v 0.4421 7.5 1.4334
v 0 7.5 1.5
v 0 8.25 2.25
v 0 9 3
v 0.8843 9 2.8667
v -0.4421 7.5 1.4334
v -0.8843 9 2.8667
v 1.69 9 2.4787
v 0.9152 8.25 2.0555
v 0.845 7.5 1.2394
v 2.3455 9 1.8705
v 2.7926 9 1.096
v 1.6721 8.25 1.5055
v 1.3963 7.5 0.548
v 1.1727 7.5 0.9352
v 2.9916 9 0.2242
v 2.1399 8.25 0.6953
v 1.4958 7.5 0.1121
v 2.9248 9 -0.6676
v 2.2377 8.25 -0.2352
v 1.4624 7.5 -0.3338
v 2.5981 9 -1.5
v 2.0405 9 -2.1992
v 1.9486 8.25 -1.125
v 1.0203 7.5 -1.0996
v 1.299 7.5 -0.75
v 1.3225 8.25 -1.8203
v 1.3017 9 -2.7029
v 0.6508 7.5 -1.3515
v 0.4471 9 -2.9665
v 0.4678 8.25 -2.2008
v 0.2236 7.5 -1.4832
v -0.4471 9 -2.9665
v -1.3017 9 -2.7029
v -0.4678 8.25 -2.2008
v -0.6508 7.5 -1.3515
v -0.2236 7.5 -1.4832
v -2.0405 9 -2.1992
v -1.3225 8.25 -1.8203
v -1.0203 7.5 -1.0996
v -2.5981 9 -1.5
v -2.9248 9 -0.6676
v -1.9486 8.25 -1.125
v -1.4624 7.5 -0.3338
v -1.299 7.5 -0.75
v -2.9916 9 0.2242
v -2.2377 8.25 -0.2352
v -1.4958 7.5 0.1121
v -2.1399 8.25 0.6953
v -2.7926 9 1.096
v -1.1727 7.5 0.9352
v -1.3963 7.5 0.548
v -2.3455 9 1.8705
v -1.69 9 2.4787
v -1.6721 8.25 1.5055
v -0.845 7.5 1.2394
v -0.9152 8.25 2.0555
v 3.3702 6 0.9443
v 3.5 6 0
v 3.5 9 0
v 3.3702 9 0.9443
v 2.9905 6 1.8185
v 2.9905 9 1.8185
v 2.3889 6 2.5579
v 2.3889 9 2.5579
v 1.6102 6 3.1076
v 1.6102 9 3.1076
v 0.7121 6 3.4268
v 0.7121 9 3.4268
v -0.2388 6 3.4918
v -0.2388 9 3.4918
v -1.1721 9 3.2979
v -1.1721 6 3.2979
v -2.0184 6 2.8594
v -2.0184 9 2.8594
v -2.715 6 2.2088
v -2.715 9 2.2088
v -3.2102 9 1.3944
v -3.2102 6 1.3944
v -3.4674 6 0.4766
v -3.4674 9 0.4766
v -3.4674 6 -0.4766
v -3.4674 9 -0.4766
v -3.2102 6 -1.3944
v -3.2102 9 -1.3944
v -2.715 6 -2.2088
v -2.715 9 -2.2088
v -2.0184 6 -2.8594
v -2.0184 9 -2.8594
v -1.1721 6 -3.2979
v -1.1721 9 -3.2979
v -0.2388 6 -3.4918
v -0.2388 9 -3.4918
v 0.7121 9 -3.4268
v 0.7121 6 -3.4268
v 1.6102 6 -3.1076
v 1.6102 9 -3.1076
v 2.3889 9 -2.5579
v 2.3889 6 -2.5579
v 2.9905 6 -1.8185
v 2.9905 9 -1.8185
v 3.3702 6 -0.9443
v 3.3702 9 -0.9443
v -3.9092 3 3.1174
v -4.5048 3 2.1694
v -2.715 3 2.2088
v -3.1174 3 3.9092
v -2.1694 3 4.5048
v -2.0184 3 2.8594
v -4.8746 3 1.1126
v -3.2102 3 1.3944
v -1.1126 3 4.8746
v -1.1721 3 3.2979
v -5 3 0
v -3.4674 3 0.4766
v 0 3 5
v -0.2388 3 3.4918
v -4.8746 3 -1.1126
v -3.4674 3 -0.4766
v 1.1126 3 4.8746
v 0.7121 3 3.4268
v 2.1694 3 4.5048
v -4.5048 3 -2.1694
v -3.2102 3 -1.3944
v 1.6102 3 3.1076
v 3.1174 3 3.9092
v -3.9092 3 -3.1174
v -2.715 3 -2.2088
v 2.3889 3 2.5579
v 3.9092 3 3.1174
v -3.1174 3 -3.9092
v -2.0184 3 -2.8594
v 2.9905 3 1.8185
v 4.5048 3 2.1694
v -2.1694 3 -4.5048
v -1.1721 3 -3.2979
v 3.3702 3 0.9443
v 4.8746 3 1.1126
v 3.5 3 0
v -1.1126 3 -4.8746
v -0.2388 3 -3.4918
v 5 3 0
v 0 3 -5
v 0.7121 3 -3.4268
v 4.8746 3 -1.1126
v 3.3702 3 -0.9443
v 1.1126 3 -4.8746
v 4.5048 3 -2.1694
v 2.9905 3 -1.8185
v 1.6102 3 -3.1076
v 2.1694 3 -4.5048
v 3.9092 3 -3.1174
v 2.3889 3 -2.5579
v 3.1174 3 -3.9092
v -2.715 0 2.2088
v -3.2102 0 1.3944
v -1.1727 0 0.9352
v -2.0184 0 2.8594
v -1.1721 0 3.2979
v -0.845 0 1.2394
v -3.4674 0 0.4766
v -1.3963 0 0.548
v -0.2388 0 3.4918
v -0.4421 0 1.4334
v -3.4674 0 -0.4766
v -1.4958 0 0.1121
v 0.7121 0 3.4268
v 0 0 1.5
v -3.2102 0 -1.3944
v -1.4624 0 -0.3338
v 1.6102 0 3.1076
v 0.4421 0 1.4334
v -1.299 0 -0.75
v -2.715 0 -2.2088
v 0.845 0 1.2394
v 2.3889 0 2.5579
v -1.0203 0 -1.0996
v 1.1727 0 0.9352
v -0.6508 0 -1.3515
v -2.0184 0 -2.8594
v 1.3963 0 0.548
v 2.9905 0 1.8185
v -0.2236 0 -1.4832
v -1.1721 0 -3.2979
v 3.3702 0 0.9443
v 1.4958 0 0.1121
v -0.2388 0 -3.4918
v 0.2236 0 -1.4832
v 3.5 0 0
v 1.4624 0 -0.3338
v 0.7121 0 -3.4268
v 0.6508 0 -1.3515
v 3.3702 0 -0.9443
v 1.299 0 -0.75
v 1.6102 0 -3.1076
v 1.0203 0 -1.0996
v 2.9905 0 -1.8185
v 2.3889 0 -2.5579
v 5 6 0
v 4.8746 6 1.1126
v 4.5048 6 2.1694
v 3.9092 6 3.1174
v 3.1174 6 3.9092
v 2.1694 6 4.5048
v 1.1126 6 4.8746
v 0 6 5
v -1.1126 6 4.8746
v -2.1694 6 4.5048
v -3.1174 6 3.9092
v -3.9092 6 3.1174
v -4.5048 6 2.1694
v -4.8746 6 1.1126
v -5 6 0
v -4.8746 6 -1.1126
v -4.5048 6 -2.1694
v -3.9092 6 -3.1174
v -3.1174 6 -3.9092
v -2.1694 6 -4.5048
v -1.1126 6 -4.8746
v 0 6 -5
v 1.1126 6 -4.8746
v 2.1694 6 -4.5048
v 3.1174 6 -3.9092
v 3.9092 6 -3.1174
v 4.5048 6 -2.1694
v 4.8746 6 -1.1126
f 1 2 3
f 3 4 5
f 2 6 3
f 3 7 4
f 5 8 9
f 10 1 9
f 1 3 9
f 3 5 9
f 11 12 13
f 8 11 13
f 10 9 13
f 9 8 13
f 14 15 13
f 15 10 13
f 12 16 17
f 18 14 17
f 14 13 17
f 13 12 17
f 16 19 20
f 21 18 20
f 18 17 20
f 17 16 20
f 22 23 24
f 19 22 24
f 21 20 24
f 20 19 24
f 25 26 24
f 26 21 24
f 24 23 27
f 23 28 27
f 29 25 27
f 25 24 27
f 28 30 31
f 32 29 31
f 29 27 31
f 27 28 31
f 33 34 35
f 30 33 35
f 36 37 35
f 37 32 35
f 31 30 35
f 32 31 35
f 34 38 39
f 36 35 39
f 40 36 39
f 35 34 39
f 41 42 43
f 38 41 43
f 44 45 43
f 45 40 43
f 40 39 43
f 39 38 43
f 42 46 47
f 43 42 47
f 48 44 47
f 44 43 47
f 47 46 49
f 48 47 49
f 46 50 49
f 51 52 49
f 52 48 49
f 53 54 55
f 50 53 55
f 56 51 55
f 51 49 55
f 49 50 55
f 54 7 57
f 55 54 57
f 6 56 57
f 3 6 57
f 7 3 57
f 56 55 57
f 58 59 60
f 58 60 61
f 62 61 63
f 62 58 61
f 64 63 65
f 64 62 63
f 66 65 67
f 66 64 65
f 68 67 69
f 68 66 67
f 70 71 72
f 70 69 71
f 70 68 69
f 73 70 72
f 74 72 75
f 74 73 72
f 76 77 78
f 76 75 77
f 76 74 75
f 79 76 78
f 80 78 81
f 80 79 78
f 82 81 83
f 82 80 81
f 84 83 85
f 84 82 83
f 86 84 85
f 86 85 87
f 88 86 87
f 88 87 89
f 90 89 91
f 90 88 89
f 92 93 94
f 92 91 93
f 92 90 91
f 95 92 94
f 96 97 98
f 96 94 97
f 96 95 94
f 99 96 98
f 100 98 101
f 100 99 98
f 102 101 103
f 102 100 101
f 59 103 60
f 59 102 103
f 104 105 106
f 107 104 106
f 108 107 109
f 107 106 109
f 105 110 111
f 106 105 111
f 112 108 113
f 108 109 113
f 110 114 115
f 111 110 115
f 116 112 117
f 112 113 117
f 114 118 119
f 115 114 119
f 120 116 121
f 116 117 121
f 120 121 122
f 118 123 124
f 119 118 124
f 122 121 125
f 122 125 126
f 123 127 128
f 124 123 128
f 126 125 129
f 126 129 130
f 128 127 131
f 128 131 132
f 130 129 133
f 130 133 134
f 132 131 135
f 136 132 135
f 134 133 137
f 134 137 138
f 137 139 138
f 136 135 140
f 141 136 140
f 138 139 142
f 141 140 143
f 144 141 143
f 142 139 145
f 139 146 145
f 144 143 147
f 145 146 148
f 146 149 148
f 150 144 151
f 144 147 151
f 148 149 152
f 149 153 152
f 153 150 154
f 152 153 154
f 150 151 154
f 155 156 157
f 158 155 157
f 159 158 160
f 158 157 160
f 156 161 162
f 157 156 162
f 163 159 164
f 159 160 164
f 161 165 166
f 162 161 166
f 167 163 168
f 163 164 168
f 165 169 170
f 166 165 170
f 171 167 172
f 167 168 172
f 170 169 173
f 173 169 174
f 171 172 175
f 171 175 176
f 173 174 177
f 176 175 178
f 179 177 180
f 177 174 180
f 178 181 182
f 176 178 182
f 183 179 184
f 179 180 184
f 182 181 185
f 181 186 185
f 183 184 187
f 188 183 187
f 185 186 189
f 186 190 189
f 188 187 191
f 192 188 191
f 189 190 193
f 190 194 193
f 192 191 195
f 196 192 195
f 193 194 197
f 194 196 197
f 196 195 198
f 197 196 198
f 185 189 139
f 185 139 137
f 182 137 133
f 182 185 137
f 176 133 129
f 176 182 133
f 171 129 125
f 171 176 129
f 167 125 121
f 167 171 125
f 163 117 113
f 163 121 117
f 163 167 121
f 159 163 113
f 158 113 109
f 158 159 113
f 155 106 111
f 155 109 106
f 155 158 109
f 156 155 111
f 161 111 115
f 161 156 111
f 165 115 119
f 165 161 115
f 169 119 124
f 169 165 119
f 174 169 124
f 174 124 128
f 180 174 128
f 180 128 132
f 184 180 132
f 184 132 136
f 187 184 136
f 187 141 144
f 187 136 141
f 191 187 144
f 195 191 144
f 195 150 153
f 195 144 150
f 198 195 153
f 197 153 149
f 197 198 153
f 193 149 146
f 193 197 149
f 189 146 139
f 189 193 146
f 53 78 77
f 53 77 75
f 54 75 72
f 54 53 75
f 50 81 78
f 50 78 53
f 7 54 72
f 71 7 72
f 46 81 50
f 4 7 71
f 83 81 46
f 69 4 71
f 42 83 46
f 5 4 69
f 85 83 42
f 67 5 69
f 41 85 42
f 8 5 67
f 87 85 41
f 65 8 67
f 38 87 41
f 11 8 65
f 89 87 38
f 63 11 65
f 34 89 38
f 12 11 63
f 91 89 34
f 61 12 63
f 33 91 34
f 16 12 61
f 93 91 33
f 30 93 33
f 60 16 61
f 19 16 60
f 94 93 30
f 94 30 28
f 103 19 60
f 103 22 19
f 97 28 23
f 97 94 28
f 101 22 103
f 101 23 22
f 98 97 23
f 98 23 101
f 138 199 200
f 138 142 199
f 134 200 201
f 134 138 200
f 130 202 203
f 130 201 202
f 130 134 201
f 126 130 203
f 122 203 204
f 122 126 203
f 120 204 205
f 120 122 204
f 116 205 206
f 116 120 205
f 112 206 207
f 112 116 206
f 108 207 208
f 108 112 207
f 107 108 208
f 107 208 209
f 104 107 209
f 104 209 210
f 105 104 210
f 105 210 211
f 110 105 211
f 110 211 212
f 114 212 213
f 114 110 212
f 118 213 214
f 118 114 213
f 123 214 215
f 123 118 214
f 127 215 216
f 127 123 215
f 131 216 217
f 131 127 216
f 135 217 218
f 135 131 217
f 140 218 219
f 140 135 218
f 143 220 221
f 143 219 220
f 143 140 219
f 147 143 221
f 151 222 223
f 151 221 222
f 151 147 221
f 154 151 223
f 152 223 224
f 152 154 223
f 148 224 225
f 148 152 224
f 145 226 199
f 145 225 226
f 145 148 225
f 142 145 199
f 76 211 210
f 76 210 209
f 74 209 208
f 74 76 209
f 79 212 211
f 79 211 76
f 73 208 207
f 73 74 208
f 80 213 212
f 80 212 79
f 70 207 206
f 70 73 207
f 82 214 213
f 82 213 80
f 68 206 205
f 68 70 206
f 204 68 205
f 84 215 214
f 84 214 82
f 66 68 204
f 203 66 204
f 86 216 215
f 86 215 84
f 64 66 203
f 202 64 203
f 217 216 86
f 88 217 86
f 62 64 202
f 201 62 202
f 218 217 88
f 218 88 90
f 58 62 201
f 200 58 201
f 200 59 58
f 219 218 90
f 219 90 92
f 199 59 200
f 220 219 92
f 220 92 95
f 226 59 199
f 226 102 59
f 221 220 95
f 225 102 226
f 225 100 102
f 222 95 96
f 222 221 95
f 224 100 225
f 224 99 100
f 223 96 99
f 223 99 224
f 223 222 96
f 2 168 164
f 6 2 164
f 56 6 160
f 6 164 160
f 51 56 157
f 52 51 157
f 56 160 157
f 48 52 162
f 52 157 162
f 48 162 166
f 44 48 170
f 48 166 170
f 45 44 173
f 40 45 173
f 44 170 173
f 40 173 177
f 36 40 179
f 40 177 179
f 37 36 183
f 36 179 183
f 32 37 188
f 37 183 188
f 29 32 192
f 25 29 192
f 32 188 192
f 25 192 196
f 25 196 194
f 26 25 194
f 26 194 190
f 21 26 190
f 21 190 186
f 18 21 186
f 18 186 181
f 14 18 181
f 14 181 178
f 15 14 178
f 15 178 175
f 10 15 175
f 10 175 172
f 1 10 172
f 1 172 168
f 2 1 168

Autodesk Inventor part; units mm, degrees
ref_plane "YZ Plane" through (0, 0, 0) normal (1, 0, 0) x (0, 1, 0)
ref_plane "XZ Plane" through (0, 0, 0) normal (0, 1, 0) x (-1, 0, 0)
ref_plane "XY Plane" through (0, 0, 0) normal (0, 0, 1) x (1, 0, 0)
sketch "Sketch1" plane through (0, 0, 0) normal (0, 0, 1) x (1, 0, 0)
  line L0 (0, 9) -> (3.5, 9)
  line L1 (3.5, 9) -> (3.5, 6)
  line L2 (3.5, 6) -> (5, 6)
  line L3 (5, 6) -> (5, 3)
  line L4 (5, 3) -> (3.5, 3)
  line L5 (3.5, 3) -> (3.5, 0)
  line L6 (3.5, 0) -> (0, 0)
  line L7 (0, 0) -> (0, 9)
  dimension "d0" = 3
  dimension "d1" = 3
  dimension "d2" = 3
  dimension "d3" = 7
  dimension "d4" = 10
revolve "Revolution1" add sketch "Sketch1" angle 360 about axis through (0, 0, 0) along (0, 1, 0)
sketch "Sketch2" plane through (0, 9, 0) normal (0, 1, 0) x (1, 0, 0)
  circle A0 centre (0, 0) radius 3.5 projected
hole "Hole1" at (0, 9, 0) direction (0, -1, 0) diameter 3 depth 9 countersink diameter 6 countersink angle 90
properties part number "26a"
